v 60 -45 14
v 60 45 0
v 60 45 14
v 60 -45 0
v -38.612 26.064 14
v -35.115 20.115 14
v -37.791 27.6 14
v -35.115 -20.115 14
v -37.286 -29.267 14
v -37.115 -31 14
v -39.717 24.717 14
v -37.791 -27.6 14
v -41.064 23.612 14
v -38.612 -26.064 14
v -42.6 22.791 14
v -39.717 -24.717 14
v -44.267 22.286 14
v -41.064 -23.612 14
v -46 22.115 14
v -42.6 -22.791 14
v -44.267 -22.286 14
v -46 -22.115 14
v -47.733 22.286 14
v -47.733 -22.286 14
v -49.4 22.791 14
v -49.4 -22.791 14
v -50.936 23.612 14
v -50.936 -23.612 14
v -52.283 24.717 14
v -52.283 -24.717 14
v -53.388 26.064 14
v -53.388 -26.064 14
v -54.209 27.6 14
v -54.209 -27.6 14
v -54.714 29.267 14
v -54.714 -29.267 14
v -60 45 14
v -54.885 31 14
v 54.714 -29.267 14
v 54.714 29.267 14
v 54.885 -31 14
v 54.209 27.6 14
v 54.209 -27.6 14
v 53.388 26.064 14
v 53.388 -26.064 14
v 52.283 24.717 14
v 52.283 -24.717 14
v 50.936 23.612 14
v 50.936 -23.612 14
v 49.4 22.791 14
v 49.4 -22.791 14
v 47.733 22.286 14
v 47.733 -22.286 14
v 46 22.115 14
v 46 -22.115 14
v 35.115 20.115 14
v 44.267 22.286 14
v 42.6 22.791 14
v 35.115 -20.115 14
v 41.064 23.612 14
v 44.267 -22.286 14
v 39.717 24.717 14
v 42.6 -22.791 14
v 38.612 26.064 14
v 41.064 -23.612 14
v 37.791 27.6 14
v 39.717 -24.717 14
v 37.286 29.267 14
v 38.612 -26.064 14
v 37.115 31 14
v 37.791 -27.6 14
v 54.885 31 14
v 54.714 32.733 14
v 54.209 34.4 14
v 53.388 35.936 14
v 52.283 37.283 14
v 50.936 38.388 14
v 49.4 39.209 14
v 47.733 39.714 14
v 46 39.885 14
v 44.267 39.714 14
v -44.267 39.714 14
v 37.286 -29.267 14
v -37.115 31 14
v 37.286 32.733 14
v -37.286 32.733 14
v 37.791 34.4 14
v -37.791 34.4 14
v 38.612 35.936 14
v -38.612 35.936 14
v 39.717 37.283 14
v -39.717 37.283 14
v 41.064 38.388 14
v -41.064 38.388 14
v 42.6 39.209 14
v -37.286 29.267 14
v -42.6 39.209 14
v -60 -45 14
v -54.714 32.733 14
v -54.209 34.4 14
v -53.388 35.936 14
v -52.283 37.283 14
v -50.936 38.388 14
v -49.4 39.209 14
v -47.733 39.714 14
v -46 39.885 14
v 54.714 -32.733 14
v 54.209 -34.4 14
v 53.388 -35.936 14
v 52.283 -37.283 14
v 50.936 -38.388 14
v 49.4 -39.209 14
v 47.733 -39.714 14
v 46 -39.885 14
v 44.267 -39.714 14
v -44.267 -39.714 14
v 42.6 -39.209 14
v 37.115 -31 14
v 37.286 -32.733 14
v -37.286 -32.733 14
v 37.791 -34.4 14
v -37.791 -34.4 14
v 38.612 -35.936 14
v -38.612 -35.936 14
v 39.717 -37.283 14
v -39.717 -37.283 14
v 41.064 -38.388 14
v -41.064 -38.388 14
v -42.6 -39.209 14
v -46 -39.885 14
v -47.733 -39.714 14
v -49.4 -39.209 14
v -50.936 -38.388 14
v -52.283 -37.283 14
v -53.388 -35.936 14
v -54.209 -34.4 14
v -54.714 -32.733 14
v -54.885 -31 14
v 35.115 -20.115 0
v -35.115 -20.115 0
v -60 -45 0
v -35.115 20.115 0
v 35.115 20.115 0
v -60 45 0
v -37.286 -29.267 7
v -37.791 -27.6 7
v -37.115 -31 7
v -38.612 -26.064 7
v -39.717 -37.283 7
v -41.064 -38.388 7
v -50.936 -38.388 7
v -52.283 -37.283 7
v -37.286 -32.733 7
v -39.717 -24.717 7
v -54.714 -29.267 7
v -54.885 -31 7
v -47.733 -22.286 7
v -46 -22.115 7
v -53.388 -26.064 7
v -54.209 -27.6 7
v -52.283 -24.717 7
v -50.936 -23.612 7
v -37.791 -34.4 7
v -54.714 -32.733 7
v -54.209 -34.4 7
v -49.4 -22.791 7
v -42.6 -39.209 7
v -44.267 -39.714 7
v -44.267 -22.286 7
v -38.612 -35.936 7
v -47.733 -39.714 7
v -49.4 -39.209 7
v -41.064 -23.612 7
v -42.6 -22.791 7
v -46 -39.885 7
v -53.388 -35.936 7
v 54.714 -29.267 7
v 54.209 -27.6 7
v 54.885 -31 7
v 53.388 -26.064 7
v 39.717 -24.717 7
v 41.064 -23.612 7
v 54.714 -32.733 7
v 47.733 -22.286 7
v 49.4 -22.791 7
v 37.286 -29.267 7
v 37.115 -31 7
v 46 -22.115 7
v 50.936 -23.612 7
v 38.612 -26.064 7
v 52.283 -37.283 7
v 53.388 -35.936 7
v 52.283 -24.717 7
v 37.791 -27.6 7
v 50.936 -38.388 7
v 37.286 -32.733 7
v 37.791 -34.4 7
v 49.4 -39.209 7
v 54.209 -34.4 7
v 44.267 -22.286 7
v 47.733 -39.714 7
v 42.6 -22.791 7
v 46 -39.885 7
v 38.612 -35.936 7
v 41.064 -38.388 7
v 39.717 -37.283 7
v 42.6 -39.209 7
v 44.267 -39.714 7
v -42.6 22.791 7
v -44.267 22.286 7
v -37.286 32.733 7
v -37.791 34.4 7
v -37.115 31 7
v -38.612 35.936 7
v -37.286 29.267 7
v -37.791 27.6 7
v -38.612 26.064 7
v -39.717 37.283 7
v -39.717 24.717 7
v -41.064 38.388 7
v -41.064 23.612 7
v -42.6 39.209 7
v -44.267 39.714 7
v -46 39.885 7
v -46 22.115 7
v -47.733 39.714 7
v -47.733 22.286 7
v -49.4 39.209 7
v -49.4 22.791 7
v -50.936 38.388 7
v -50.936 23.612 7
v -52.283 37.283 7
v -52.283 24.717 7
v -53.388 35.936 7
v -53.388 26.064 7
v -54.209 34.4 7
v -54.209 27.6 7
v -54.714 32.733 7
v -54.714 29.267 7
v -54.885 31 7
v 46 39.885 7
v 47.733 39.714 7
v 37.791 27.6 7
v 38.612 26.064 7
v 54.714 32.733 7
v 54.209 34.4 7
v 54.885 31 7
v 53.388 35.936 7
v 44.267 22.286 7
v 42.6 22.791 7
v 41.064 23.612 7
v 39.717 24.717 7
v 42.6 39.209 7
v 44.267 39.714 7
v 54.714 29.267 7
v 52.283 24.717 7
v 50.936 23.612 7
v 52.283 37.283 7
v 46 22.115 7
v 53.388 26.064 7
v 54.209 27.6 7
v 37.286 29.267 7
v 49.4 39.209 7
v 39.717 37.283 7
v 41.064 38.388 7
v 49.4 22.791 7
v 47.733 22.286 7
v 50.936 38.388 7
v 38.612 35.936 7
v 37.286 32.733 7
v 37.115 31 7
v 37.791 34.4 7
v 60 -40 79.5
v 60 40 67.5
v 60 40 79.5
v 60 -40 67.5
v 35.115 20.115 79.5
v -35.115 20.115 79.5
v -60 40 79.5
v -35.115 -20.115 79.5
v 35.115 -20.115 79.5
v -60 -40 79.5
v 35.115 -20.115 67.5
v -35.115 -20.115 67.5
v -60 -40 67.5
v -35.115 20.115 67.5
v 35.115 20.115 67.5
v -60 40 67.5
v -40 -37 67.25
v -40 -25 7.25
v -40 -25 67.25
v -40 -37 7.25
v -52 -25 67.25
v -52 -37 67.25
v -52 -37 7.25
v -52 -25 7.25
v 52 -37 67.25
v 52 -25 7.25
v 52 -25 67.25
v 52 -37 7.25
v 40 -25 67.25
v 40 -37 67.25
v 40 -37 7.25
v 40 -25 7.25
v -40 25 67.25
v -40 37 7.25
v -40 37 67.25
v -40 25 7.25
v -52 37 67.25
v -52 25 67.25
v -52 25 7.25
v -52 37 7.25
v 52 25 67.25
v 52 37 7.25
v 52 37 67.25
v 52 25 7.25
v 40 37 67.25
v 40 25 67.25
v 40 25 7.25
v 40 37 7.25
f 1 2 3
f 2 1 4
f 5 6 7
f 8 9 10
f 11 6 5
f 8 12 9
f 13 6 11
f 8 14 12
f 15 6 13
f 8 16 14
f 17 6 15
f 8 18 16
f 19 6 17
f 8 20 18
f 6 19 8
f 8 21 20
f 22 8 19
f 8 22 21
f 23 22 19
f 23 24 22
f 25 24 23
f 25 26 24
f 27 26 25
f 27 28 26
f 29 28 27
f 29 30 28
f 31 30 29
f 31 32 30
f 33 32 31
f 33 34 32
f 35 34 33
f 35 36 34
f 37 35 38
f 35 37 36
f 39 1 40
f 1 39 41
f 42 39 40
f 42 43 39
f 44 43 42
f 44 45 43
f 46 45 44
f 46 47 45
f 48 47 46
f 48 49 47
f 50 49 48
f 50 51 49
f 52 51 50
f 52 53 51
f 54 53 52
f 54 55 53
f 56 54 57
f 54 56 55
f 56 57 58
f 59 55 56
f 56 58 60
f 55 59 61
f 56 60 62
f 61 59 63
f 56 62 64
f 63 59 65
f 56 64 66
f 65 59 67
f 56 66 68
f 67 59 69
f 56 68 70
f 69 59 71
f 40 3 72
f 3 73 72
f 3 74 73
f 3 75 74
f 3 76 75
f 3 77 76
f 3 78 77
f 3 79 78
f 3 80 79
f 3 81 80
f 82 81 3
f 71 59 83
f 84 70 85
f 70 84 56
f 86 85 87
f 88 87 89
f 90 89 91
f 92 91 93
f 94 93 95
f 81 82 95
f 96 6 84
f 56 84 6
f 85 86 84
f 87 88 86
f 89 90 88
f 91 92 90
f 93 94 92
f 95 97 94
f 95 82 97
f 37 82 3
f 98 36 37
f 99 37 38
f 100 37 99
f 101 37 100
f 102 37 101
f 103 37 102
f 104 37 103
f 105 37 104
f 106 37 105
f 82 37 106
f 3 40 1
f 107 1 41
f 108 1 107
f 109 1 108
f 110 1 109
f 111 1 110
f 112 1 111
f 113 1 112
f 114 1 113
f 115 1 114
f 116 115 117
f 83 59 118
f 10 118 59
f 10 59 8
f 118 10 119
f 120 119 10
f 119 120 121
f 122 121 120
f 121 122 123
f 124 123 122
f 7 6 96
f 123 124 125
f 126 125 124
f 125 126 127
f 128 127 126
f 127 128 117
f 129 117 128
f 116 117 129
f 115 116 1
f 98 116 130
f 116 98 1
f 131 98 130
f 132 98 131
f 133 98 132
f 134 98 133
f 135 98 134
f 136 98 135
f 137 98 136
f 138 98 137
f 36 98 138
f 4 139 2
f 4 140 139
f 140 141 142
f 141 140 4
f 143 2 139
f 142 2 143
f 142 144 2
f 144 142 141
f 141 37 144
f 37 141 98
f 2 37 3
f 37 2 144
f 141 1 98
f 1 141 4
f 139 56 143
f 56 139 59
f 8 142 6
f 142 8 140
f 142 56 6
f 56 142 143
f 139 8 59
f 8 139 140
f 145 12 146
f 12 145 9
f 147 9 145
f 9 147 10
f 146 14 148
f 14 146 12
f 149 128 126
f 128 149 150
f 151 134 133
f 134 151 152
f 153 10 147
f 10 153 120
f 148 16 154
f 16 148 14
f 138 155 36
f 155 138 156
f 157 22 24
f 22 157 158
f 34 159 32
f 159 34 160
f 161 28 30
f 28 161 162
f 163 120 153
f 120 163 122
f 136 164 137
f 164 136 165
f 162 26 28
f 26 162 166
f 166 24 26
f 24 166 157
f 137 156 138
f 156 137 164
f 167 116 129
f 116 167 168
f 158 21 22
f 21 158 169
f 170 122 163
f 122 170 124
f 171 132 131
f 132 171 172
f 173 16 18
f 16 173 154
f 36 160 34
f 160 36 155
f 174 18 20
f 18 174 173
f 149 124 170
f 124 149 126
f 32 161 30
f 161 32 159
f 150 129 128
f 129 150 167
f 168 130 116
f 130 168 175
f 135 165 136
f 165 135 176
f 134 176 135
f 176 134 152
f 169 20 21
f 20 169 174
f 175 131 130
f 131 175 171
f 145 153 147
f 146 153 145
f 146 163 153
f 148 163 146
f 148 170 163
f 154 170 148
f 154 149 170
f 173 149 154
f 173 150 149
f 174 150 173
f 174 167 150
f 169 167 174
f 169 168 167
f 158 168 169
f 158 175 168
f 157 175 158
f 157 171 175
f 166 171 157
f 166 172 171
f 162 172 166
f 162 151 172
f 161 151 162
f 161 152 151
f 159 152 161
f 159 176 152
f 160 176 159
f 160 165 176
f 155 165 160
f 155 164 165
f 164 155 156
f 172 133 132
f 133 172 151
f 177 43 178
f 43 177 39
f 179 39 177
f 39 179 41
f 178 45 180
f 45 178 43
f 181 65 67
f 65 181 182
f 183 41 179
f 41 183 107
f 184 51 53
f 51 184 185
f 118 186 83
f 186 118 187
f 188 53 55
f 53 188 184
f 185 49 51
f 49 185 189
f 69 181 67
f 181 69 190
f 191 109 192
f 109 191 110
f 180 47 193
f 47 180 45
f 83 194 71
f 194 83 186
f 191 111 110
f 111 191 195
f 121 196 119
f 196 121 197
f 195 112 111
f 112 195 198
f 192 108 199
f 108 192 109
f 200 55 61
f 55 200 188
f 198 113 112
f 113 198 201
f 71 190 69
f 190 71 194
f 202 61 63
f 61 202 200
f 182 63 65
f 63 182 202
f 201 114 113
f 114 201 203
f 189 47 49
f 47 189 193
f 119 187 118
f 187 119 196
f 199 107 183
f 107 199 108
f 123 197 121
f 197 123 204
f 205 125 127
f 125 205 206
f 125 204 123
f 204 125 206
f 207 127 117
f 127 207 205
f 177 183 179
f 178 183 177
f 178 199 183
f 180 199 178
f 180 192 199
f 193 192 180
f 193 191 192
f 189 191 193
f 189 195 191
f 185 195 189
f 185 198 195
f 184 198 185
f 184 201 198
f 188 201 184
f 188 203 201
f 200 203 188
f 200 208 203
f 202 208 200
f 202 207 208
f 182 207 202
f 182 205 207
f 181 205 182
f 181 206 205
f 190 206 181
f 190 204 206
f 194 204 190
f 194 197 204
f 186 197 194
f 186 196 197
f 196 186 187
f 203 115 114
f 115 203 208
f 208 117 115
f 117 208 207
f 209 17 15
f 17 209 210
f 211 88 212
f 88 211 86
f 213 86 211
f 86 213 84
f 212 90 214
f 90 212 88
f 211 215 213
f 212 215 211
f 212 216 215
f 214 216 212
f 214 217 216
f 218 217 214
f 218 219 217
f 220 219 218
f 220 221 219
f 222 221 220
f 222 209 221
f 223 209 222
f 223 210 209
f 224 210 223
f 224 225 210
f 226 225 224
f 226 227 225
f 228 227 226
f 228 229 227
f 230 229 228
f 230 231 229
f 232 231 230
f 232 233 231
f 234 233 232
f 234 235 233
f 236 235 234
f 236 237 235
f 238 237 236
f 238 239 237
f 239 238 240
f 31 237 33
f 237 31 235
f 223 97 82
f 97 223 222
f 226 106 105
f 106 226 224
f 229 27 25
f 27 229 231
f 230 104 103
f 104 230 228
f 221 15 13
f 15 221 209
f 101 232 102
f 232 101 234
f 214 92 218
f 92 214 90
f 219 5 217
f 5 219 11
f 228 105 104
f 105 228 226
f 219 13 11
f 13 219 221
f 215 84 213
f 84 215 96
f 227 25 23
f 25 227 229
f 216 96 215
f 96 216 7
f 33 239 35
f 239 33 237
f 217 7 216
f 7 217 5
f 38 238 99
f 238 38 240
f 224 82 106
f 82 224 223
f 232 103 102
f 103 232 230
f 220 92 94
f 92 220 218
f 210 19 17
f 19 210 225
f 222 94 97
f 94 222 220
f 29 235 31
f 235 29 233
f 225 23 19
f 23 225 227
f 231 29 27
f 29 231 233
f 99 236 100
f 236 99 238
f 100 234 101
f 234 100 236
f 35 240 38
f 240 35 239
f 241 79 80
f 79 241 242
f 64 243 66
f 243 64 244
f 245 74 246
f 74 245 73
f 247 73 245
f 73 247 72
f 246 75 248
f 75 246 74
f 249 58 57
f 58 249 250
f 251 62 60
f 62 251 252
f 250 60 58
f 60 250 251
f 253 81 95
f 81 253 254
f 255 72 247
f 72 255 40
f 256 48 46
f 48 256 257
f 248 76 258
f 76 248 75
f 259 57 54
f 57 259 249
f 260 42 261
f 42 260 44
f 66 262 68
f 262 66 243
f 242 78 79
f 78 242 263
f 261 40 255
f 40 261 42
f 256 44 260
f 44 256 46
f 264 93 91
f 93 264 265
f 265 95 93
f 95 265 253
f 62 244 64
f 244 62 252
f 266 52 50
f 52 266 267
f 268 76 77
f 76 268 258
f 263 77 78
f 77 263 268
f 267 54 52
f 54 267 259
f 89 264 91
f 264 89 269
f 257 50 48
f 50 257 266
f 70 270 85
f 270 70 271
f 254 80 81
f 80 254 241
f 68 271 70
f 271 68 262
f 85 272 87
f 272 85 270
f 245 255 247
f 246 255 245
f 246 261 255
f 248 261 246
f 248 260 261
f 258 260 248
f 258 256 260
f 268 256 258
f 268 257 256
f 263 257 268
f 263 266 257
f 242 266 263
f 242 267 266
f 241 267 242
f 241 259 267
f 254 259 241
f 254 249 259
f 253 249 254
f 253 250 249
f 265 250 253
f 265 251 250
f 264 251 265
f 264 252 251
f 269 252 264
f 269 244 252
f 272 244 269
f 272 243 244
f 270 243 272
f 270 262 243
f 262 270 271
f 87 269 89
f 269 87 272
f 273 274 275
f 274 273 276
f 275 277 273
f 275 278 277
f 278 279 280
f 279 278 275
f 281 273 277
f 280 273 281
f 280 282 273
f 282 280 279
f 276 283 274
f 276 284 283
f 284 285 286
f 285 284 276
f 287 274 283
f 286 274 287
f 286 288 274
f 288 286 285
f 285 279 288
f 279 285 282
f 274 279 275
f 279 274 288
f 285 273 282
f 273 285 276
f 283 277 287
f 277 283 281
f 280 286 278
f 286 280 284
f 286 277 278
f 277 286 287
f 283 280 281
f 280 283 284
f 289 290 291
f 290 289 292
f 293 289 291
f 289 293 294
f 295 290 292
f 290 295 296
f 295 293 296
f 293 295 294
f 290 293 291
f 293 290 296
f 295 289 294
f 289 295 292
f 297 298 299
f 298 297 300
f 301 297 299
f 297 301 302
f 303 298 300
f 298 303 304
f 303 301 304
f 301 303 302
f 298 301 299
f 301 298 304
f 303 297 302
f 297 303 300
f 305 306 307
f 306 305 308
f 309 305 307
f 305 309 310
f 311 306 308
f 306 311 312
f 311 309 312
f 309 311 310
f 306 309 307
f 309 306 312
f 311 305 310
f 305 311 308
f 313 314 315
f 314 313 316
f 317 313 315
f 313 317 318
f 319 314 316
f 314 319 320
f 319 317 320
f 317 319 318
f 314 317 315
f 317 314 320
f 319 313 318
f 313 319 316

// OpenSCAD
$fn = 32;

// ------------------------------------------------------------------------
// Frame cube: base 120 x 90 mm, posts 60 mm tall
// Every part is its own module, assembly() places every instance.
// ------------------------------------------------------------------------

// --- part 1 ---
module base_frame() {
  difference() {
    translate([-60, -45, 0]) cube([120, 90, 14]);
    translate([-35.115, -20.115, -1]) cube([70.23, 40.23, 16]);
    translate([-46, -31, 7]) cylinder(h = 8, d = 17.77);
    translate([46, -31, 7]) cylinder(h = 8, d = 17.77);
    translate([-46, 31, 7]) cylinder(h = 8, d = 17.77);
    translate([46, 31, 7]) cylinder(h = 8, d = 17.77);
  }
}

// --- part 2 ---
module corner_post() {
  translate([-6, -6, 0]) cube([12, 12, 60]);
}

// --- part 3 ---
module top_frame() {
  difference() {
    translate([-60, -40, 0]) cube([120, 80, 12]);
    translate([-35.115, -20.115, -1]) cube([70.23, 40.23, 14]);
  }
}

// --- assembly ---
module assembly() {
  color([0.80, 0.24, 0.20]) translate([0, 0, 0]) rotate([0, 0, 0]) base_frame();
  color([0.20, 0.45, 0.75]) translate([-46, -31, 7.25]) rotate([0, 0, 0]) corner_post();
  color([0.25, 0.62, 0.32]) translate([46, -31, 7.25]) rotate([0, 0, 0]) corner_post();
  color([0.92, 0.70, 0.18]) translate([-46, 31, 7.25]) rotate([0, 0, 0]) corner_post();
  color([0.58, 0.35, 0.70]) translate([46, 31, 7.25]) rotate([0, 0, 0]) corner_post();
  color([0.16, 0.66, 0.66]) translate([0, 0, 67.5]) rotate([0, 0, 0]) top_frame();
}

assembly();
